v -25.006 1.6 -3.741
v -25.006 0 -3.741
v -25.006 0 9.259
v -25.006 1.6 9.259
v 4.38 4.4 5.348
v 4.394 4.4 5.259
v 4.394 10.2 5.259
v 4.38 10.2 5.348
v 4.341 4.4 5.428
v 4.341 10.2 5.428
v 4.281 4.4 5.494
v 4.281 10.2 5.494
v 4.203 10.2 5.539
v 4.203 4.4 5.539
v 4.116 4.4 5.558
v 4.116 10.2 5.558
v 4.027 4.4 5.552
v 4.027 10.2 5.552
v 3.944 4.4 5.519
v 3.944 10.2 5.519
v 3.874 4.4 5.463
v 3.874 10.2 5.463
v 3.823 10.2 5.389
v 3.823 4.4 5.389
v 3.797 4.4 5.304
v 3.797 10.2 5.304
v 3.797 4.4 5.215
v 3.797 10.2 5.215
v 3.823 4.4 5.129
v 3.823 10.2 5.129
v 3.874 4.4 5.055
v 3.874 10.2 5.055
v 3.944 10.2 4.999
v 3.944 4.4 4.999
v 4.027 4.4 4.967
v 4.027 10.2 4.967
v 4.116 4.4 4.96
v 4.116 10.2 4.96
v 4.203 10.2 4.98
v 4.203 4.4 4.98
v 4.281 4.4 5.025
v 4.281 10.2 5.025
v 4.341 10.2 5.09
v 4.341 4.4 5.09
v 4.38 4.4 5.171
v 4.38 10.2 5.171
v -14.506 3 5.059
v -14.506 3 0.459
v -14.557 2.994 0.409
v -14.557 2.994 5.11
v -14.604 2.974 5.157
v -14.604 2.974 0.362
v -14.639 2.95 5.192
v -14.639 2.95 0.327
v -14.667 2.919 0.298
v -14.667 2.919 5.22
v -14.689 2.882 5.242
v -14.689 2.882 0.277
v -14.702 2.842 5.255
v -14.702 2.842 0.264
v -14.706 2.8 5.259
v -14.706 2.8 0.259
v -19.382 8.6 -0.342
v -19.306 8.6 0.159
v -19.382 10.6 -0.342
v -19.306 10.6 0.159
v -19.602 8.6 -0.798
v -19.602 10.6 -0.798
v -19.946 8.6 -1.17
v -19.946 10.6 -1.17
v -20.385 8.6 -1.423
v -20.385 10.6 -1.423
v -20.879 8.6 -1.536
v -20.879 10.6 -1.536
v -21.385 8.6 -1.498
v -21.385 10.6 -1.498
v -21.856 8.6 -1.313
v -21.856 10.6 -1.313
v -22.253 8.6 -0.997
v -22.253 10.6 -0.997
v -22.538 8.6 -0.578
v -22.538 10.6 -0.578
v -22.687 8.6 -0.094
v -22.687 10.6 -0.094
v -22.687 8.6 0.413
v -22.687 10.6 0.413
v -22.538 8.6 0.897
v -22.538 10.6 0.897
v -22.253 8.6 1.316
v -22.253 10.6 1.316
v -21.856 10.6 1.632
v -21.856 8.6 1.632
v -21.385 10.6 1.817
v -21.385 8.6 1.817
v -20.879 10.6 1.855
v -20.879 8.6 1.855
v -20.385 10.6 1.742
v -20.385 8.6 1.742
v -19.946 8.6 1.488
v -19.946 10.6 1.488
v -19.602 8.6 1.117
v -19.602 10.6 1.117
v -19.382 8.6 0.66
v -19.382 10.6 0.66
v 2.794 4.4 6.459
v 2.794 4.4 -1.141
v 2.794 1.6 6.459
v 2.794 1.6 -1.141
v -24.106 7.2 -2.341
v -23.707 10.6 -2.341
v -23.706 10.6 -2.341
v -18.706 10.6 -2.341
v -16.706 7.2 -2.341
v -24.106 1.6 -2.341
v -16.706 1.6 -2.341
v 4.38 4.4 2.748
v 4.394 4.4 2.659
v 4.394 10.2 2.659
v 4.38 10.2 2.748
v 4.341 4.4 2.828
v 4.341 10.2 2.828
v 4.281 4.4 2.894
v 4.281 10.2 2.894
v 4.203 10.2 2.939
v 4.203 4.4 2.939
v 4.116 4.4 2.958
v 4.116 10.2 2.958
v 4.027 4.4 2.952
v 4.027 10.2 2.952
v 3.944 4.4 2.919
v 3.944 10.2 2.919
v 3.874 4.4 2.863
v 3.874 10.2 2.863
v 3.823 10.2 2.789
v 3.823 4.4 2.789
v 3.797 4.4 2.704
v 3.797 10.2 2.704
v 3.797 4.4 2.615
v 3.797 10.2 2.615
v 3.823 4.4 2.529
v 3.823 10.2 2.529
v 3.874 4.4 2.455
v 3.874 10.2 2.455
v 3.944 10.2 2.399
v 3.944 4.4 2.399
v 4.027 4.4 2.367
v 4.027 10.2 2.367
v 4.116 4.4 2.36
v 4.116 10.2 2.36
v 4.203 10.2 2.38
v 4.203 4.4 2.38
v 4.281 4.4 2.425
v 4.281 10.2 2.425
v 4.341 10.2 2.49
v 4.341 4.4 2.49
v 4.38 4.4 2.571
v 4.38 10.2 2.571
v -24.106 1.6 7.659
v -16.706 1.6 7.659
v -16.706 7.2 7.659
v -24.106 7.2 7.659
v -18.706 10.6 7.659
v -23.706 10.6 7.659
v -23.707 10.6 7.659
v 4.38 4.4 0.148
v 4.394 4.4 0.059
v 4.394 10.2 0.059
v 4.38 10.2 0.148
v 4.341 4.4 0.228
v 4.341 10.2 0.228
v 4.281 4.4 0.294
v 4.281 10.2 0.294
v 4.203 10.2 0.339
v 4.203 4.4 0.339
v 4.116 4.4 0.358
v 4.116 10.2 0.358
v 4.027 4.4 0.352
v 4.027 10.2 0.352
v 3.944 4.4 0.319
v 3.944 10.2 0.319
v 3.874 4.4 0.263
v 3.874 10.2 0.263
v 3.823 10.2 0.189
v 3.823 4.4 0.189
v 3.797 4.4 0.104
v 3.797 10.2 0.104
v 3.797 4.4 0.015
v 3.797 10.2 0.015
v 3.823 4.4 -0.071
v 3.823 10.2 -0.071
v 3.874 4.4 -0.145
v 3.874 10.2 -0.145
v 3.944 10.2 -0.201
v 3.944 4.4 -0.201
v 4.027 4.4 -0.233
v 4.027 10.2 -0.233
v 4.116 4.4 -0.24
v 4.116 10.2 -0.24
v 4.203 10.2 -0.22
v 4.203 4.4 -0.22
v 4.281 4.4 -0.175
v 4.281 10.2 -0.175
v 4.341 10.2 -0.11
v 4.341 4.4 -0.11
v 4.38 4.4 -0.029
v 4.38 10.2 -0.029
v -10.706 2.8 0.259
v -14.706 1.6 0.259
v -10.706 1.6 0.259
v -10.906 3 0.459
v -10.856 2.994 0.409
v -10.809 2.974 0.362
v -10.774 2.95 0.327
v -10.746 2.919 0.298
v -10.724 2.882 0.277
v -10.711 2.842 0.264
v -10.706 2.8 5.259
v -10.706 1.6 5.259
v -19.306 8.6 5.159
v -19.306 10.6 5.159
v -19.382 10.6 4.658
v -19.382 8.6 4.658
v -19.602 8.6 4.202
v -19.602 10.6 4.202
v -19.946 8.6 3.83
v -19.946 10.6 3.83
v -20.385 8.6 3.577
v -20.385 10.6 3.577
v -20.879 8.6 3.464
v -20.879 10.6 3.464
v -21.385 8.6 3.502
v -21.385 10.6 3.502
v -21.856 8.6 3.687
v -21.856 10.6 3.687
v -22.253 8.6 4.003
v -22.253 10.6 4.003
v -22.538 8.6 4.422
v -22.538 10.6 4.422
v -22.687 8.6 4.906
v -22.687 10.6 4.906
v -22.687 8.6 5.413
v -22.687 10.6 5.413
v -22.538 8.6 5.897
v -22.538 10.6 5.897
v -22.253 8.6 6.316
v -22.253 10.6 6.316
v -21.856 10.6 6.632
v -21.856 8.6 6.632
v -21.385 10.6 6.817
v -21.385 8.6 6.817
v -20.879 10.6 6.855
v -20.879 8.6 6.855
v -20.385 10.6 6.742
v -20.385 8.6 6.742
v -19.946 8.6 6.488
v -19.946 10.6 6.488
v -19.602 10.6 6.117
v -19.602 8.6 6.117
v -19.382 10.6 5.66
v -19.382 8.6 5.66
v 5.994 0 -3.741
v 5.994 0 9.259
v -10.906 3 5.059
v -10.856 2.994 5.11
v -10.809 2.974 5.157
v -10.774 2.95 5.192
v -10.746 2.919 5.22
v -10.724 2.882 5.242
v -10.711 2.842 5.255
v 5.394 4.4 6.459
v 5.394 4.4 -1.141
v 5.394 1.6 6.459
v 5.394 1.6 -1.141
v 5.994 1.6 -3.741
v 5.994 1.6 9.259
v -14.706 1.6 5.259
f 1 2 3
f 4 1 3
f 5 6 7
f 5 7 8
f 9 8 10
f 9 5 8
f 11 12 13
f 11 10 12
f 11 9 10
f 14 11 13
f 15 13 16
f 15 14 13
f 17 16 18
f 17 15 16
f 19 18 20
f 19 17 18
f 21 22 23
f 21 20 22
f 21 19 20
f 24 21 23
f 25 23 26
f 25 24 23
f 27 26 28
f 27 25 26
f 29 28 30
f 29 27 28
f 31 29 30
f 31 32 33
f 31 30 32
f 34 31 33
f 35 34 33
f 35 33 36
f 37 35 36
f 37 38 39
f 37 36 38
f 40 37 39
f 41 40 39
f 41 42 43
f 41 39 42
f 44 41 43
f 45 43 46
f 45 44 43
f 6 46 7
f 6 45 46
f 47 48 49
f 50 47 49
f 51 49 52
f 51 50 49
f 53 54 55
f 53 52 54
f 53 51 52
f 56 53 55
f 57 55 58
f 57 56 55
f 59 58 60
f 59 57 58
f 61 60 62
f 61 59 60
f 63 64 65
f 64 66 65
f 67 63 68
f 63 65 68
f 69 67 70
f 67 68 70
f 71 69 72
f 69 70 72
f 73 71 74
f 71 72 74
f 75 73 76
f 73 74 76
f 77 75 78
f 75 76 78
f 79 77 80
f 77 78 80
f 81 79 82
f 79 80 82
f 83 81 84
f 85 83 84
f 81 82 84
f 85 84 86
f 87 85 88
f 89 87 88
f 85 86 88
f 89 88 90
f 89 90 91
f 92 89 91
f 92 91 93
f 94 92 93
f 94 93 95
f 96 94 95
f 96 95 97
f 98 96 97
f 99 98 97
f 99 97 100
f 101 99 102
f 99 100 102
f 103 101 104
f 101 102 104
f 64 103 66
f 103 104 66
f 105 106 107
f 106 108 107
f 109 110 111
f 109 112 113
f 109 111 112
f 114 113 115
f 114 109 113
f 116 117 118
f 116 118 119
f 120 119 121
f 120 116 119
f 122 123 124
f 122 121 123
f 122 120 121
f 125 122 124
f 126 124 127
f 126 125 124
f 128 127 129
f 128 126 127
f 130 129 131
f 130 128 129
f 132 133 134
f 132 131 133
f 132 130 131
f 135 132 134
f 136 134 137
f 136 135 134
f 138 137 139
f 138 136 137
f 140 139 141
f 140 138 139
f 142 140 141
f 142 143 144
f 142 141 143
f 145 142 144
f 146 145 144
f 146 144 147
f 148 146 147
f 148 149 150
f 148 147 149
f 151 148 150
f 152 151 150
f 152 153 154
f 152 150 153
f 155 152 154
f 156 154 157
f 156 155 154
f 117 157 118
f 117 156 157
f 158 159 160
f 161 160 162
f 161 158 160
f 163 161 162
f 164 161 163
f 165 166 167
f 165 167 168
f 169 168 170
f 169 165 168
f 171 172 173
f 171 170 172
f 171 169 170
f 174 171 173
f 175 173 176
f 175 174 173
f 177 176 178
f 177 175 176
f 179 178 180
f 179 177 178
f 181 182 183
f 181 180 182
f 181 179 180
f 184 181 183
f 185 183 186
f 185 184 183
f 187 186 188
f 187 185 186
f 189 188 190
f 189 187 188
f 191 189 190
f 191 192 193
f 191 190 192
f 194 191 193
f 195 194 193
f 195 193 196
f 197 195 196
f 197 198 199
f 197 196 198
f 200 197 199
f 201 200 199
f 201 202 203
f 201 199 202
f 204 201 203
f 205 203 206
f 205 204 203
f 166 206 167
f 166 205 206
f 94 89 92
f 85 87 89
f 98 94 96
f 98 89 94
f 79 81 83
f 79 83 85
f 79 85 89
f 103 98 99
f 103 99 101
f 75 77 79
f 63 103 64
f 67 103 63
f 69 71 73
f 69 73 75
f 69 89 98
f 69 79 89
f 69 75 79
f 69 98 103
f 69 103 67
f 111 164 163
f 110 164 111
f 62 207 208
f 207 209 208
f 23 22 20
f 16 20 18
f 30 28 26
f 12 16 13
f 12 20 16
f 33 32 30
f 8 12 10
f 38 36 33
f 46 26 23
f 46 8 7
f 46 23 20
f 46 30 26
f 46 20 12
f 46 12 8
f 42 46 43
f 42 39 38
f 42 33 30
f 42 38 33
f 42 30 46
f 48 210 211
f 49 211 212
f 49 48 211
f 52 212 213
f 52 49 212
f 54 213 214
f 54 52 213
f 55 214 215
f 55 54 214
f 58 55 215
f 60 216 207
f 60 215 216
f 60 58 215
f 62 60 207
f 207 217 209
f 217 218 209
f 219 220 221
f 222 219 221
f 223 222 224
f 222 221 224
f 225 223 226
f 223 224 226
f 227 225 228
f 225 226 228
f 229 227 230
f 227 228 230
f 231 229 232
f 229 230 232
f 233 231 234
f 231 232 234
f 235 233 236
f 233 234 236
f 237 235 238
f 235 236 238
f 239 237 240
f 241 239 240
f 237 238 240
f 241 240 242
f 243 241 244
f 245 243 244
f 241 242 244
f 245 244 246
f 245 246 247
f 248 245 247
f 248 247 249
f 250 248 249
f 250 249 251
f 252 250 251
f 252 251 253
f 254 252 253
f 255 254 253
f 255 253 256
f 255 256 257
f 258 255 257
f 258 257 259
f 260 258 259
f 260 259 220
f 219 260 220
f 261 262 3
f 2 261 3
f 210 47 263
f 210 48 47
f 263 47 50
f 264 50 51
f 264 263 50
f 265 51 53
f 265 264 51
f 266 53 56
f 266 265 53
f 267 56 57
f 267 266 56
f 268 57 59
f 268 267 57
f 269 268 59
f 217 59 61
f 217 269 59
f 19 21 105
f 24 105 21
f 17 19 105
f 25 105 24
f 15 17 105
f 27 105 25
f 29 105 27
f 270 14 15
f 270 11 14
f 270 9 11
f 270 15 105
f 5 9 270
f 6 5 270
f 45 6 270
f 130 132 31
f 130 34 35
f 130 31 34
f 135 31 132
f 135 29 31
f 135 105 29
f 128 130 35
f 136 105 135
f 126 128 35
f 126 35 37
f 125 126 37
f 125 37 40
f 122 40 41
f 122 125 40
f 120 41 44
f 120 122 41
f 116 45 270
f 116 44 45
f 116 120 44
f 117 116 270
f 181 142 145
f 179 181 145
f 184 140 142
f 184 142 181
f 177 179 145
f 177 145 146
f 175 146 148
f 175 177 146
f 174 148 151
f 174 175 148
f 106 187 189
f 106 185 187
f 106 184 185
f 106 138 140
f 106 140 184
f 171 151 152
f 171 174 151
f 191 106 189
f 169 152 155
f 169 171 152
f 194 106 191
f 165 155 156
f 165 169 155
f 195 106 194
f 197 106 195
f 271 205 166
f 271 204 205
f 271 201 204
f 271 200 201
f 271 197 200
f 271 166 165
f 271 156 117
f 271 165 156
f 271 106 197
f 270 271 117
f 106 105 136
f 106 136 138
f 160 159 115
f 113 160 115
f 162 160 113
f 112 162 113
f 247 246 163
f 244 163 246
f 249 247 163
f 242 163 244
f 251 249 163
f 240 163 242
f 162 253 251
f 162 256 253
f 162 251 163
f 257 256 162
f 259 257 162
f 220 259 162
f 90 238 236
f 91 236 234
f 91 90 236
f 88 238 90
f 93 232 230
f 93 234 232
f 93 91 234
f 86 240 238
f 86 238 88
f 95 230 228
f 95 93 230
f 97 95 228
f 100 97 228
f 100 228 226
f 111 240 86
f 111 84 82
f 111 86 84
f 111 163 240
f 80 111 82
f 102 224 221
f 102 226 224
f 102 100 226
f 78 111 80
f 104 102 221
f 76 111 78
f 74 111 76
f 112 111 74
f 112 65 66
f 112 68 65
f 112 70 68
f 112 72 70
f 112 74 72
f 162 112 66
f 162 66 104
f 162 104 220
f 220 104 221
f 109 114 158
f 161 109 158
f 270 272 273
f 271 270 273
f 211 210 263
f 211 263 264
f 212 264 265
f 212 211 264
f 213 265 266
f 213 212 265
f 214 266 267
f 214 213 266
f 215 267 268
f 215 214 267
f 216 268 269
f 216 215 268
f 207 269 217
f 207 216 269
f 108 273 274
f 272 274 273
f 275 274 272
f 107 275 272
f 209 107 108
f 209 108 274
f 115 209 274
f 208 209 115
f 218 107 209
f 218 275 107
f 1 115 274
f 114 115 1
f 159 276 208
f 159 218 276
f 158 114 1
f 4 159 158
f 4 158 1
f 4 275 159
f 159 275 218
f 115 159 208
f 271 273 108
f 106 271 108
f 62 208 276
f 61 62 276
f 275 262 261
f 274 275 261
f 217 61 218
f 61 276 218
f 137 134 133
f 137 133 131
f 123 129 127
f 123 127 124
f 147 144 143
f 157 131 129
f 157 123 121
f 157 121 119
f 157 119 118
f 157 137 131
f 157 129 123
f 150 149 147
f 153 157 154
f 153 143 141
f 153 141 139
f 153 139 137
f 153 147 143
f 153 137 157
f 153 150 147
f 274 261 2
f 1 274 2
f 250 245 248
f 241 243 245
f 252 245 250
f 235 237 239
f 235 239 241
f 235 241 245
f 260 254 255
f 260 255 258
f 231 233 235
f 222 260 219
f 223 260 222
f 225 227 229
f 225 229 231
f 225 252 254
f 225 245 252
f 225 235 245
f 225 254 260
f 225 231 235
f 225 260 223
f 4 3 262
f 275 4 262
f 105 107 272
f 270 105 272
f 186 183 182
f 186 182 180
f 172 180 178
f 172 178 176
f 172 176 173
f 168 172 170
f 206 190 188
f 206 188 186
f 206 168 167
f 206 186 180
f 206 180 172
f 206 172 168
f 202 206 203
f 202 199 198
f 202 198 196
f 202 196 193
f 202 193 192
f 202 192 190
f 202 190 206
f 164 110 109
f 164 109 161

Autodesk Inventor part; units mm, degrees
ref_plane "YZ Plane" through (0, 0, 0) normal (1, 0, 0) x (0, 1, 0)
ref_plane "XZ Plane" through (0, 0, 0) normal (0, 1, 0) x (-1, 0, 0)
ref_plane "XY Plane" through (0, 0, 0) normal (0, 0, 1) x (1, 0, 0)
sketch "Sketch1" plane through (0, 0, 0) normal (0, 1, 0) x (-1, 0, 0)
  line L0 (25.0064, 9.2593) -> (-5.9936, 9.2593)
  line L1 (-5.9936, 9.2593) -> (-5.9936, -3.7407)
  line L2 (-5.9936, -3.7407) -> (25.0064, -3.7407)
  line L3 (25.0064, -3.7407) -> (25.0064, 9.2593)
  point P0 (0, 0)
  dimension "d0" = 31
  dimension "d1" = 13
extrude "Extrusion1" add sketch "Sketch1" along normal blind 1.6
sketch "Sketch2" plane through (0, 1.6, 0) normal (0, 1, 0) x (1, 0, 0)
  line L0 (5.9936, -9.2593) -> (5.9936, 3.7407) projected
  line L1 (5.9936, 3.7407) -> (-25.0064, 3.7407) projected
  line L2 (5.3936, -6.4593) -> (5.3936, 1.1407)
  line L3 (5.3936, 1.1407) -> (2.7936, 1.1407)
  line L4 (2.7936, 1.1407) -> (2.7936, -6.4593)
  line L5 (2.7936, -6.4593) -> (5.3936, -6.4593)
  point P0 (0, 0)
  point P1 (5.9936, 1.1407)
  point P2 (5.9936, -6.4593)
  dimension "d9" = 2.6
  dimension "d10" = 7.6
  dimension "d12" = 2.6
  dimension "d13" = 0.6
extrude "Extrusion2" add sketch "Sketch2" along normal blind 2.8
sketch "Sketch3" plane through (0, 4.4, 0) normal (0, 1, 0) x (1, 0, 0)
  circle A0 centre (4.0936, -5.2593) radius 0.3
  circle A1 centre (4.0936, -2.6593) radius 0.3
  circle A2 centre (4.0936, -0.0593) radius 0.3
  line L0 (5.3936, -6.4593) -> (5.3936, 1.1407) projected
  line L1 (2.7936, -6.4593) -> (5.3936, -6.4593) projected
  point P0 (0, 0)
  dimension "d14" = 0.6
  dimension "d15" = 0.6
  dimension "d16" = 0.6
  dimension "d17" = 1.3
  dimension "d18" = 1.3
  dimension "d19" = 1.3
  dimension "d20" = 2
  dimension "d21" = 2
  dimension "d22" = 1.2
extrude "Extrusion3" add sketch "Sketch3" along normal blind 5.8
sketch "Sketch4" plane through (0, 1.6, 0) normal (0, 1, 0) x (1, 0, 0)
  line L0 (-24.1064, -7.6593) -> (-16.7064, -7.6593)
  line L1 (-16.7064, -7.6593) -> (-16.7064, 2.3407)
  line L2 (-16.7064, 2.3407) -> (-24.1064, 2.3407)
  line L3 (-24.1064, 2.3407) -> (-24.1064, -7.6593)
  line L4 (-25.0064, 3.7407) -> (-25.0064, -9.2593) projected
  line L5 (-25.0064, -9.2593) -> (5.9936, -9.2593) projected
  point P0 (0, 0)
  dimension "d25" = 7.4
  dimension "d26" = 10
  dimension "d27" = 0.9
  dimension "d28" = 1.6
extrude "Extrusion4" add sketch "Sketch4" along normal blind 5.6
sketch "Sketch5" plane through (0, 7.2, 0) normal (0, 1, 0) x (1, 0, 0)
  line L0 (-23.7064, -7.6593) -> (-18.7064, -7.6593)
  line L1 (-18.7064, -7.6593) -> (-18.7064, 2.3407)
  line L2 (-18.7064, 2.3407) -> (-23.7064, 2.3407)
  line L3 (-23.7064, 2.3407) -> (-23.7064, -7.6593)
  line L4 (-24.1064, -7.6593) -> (-16.7064, -7.6593) projected
  line L5 (-24.1064, 2.3407) -> (-16.7064, 2.3407) projected
  line L6 (-16.7064, -7.6593) -> (-16.7064, 2.3407) projected
  point P0 (0, 0)
  dimension "d31" = 5
  dimension "d32" = 0
  dimension "d33" = 0
  dimension "d34" = 2
extrude "Extrusion5" add sketch "Sketch5" along normal blind 3.4 contours L3 L2 L1 L0
ref_plane "Work Plane1" through (-24.1064, 7.2, -2.3407) normal (-0.9932, 0.1168, 0) x (0, 0, 1)
sketch "Sketch6" plane through (-24.1064, 7.2, -2.3407) normal (-0.9932, 0.1168, 0) x (0, 0, 1)
  line L0 (0, 3.4234) -> (0, 0)
  line L1 (0, 0) -> (10, 0) projected
  line L2 (0, 0) -> (10, 0)
  line L3 (10, 0) -> (10, 3.4234)
  line L4 (10, 3.4234) -> (0, 3.4234)
  line L5 (0, 3.4234) -> (10, 3.4234) projected
  point P0 (2.3407, -4.3341)
extrude "Extrusion6" add sketch "Sketch6" against normal blind 1
ref_plane "Work Plane2" through (-18.7064, 10.6, 7.6593) normal (-0.8619, -0.507, 0) x (0, 0, -1)
sketch "Sketch7" plane through (-18.7064, 10.6, 7.6593) normal (-0.8619, -0.507, 0) x (0, 0, -1)
  line L0 (0, 0) -> (0, 3.9446)
  line L1 (0, 3.9446) -> (10, 3.9446)
  line L2 (0, 3.9446) -> (10, 3.9446) projected
  line L3 (10, 3.9446) -> (10, 0)
  line L4 (10, 0) -> (0, 0)
  point P0 (7.6593, 18.621)
extrude "Extrusion7" add sketch "Sketch7" along normal blind 2
sketch "Sketch8" plane through (0, 10.6, 0) normal (0, 1, 0) x (1, 0, 0)
  circle A0 centre (-21.0064, -0.1593) radius 1.7
  circle A1 centre (-21.0064, -5.1593) radius 1.7
  line L0 (-18.7064, 2.3407) -> (-23.7064, 2.3407) projected
  line L1 (-23.7064, 2.3407) -> (-23.7064, -7.6593) projected
  point P0 (0, 0)
  dimension "d41" = 3.4
  dimension "d42" = 3.4
  dimension "d43" = 2.5
  dimension "d44" = 5
  dimension "d45" = 2.7
  dimension "d46" = 2.7
extrude "Extrusion8" cut sketch "Sketch8" against normal blind 2
sketch "Sketch9" plane through (0, 1.6, 0) normal (0, 1, 0) x (1, 0, 0)
  line L0 (-14.7064, -5.2593) -> (-10.7064, -5.2593)
  line L1 (-10.7064, -5.2593) -> (-10.7064, -0.2593)
  line L2 (-10.7064, -0.2593) -> (-14.7064, -0.2593)
  line L3 (-14.7064, -0.2593) -> (-14.7064, -5.2593)
  line L4 (-16.7064, -7.6593) -> (-16.7064, 2.3407) projected
  line L5 (5.9936, 3.7407) -> (-25.0064, 3.7407) projected
  point P0 (0, 0)
  dimension "d49" = 4
  dimension "d50" = 5
  dimension "d51" = 2
  dimension "d52" = 4
extrude "Extrusion9" add sketch "Sketch9" along normal blind 1.4
fillet "Fillet1" radius 0.2 4 edges at (-10.7064, 3, 2.7593) (-12.7064, 3, 5.2593) (-14.7064, 3, 2.7593) (-12.7064, 3, 0.2593)
equation "\"d18\" = d17"
equation "\"d19\" = d17"
equation "\"d46\" = d45"
properties part number "ACS712(prudovy snimac)"
